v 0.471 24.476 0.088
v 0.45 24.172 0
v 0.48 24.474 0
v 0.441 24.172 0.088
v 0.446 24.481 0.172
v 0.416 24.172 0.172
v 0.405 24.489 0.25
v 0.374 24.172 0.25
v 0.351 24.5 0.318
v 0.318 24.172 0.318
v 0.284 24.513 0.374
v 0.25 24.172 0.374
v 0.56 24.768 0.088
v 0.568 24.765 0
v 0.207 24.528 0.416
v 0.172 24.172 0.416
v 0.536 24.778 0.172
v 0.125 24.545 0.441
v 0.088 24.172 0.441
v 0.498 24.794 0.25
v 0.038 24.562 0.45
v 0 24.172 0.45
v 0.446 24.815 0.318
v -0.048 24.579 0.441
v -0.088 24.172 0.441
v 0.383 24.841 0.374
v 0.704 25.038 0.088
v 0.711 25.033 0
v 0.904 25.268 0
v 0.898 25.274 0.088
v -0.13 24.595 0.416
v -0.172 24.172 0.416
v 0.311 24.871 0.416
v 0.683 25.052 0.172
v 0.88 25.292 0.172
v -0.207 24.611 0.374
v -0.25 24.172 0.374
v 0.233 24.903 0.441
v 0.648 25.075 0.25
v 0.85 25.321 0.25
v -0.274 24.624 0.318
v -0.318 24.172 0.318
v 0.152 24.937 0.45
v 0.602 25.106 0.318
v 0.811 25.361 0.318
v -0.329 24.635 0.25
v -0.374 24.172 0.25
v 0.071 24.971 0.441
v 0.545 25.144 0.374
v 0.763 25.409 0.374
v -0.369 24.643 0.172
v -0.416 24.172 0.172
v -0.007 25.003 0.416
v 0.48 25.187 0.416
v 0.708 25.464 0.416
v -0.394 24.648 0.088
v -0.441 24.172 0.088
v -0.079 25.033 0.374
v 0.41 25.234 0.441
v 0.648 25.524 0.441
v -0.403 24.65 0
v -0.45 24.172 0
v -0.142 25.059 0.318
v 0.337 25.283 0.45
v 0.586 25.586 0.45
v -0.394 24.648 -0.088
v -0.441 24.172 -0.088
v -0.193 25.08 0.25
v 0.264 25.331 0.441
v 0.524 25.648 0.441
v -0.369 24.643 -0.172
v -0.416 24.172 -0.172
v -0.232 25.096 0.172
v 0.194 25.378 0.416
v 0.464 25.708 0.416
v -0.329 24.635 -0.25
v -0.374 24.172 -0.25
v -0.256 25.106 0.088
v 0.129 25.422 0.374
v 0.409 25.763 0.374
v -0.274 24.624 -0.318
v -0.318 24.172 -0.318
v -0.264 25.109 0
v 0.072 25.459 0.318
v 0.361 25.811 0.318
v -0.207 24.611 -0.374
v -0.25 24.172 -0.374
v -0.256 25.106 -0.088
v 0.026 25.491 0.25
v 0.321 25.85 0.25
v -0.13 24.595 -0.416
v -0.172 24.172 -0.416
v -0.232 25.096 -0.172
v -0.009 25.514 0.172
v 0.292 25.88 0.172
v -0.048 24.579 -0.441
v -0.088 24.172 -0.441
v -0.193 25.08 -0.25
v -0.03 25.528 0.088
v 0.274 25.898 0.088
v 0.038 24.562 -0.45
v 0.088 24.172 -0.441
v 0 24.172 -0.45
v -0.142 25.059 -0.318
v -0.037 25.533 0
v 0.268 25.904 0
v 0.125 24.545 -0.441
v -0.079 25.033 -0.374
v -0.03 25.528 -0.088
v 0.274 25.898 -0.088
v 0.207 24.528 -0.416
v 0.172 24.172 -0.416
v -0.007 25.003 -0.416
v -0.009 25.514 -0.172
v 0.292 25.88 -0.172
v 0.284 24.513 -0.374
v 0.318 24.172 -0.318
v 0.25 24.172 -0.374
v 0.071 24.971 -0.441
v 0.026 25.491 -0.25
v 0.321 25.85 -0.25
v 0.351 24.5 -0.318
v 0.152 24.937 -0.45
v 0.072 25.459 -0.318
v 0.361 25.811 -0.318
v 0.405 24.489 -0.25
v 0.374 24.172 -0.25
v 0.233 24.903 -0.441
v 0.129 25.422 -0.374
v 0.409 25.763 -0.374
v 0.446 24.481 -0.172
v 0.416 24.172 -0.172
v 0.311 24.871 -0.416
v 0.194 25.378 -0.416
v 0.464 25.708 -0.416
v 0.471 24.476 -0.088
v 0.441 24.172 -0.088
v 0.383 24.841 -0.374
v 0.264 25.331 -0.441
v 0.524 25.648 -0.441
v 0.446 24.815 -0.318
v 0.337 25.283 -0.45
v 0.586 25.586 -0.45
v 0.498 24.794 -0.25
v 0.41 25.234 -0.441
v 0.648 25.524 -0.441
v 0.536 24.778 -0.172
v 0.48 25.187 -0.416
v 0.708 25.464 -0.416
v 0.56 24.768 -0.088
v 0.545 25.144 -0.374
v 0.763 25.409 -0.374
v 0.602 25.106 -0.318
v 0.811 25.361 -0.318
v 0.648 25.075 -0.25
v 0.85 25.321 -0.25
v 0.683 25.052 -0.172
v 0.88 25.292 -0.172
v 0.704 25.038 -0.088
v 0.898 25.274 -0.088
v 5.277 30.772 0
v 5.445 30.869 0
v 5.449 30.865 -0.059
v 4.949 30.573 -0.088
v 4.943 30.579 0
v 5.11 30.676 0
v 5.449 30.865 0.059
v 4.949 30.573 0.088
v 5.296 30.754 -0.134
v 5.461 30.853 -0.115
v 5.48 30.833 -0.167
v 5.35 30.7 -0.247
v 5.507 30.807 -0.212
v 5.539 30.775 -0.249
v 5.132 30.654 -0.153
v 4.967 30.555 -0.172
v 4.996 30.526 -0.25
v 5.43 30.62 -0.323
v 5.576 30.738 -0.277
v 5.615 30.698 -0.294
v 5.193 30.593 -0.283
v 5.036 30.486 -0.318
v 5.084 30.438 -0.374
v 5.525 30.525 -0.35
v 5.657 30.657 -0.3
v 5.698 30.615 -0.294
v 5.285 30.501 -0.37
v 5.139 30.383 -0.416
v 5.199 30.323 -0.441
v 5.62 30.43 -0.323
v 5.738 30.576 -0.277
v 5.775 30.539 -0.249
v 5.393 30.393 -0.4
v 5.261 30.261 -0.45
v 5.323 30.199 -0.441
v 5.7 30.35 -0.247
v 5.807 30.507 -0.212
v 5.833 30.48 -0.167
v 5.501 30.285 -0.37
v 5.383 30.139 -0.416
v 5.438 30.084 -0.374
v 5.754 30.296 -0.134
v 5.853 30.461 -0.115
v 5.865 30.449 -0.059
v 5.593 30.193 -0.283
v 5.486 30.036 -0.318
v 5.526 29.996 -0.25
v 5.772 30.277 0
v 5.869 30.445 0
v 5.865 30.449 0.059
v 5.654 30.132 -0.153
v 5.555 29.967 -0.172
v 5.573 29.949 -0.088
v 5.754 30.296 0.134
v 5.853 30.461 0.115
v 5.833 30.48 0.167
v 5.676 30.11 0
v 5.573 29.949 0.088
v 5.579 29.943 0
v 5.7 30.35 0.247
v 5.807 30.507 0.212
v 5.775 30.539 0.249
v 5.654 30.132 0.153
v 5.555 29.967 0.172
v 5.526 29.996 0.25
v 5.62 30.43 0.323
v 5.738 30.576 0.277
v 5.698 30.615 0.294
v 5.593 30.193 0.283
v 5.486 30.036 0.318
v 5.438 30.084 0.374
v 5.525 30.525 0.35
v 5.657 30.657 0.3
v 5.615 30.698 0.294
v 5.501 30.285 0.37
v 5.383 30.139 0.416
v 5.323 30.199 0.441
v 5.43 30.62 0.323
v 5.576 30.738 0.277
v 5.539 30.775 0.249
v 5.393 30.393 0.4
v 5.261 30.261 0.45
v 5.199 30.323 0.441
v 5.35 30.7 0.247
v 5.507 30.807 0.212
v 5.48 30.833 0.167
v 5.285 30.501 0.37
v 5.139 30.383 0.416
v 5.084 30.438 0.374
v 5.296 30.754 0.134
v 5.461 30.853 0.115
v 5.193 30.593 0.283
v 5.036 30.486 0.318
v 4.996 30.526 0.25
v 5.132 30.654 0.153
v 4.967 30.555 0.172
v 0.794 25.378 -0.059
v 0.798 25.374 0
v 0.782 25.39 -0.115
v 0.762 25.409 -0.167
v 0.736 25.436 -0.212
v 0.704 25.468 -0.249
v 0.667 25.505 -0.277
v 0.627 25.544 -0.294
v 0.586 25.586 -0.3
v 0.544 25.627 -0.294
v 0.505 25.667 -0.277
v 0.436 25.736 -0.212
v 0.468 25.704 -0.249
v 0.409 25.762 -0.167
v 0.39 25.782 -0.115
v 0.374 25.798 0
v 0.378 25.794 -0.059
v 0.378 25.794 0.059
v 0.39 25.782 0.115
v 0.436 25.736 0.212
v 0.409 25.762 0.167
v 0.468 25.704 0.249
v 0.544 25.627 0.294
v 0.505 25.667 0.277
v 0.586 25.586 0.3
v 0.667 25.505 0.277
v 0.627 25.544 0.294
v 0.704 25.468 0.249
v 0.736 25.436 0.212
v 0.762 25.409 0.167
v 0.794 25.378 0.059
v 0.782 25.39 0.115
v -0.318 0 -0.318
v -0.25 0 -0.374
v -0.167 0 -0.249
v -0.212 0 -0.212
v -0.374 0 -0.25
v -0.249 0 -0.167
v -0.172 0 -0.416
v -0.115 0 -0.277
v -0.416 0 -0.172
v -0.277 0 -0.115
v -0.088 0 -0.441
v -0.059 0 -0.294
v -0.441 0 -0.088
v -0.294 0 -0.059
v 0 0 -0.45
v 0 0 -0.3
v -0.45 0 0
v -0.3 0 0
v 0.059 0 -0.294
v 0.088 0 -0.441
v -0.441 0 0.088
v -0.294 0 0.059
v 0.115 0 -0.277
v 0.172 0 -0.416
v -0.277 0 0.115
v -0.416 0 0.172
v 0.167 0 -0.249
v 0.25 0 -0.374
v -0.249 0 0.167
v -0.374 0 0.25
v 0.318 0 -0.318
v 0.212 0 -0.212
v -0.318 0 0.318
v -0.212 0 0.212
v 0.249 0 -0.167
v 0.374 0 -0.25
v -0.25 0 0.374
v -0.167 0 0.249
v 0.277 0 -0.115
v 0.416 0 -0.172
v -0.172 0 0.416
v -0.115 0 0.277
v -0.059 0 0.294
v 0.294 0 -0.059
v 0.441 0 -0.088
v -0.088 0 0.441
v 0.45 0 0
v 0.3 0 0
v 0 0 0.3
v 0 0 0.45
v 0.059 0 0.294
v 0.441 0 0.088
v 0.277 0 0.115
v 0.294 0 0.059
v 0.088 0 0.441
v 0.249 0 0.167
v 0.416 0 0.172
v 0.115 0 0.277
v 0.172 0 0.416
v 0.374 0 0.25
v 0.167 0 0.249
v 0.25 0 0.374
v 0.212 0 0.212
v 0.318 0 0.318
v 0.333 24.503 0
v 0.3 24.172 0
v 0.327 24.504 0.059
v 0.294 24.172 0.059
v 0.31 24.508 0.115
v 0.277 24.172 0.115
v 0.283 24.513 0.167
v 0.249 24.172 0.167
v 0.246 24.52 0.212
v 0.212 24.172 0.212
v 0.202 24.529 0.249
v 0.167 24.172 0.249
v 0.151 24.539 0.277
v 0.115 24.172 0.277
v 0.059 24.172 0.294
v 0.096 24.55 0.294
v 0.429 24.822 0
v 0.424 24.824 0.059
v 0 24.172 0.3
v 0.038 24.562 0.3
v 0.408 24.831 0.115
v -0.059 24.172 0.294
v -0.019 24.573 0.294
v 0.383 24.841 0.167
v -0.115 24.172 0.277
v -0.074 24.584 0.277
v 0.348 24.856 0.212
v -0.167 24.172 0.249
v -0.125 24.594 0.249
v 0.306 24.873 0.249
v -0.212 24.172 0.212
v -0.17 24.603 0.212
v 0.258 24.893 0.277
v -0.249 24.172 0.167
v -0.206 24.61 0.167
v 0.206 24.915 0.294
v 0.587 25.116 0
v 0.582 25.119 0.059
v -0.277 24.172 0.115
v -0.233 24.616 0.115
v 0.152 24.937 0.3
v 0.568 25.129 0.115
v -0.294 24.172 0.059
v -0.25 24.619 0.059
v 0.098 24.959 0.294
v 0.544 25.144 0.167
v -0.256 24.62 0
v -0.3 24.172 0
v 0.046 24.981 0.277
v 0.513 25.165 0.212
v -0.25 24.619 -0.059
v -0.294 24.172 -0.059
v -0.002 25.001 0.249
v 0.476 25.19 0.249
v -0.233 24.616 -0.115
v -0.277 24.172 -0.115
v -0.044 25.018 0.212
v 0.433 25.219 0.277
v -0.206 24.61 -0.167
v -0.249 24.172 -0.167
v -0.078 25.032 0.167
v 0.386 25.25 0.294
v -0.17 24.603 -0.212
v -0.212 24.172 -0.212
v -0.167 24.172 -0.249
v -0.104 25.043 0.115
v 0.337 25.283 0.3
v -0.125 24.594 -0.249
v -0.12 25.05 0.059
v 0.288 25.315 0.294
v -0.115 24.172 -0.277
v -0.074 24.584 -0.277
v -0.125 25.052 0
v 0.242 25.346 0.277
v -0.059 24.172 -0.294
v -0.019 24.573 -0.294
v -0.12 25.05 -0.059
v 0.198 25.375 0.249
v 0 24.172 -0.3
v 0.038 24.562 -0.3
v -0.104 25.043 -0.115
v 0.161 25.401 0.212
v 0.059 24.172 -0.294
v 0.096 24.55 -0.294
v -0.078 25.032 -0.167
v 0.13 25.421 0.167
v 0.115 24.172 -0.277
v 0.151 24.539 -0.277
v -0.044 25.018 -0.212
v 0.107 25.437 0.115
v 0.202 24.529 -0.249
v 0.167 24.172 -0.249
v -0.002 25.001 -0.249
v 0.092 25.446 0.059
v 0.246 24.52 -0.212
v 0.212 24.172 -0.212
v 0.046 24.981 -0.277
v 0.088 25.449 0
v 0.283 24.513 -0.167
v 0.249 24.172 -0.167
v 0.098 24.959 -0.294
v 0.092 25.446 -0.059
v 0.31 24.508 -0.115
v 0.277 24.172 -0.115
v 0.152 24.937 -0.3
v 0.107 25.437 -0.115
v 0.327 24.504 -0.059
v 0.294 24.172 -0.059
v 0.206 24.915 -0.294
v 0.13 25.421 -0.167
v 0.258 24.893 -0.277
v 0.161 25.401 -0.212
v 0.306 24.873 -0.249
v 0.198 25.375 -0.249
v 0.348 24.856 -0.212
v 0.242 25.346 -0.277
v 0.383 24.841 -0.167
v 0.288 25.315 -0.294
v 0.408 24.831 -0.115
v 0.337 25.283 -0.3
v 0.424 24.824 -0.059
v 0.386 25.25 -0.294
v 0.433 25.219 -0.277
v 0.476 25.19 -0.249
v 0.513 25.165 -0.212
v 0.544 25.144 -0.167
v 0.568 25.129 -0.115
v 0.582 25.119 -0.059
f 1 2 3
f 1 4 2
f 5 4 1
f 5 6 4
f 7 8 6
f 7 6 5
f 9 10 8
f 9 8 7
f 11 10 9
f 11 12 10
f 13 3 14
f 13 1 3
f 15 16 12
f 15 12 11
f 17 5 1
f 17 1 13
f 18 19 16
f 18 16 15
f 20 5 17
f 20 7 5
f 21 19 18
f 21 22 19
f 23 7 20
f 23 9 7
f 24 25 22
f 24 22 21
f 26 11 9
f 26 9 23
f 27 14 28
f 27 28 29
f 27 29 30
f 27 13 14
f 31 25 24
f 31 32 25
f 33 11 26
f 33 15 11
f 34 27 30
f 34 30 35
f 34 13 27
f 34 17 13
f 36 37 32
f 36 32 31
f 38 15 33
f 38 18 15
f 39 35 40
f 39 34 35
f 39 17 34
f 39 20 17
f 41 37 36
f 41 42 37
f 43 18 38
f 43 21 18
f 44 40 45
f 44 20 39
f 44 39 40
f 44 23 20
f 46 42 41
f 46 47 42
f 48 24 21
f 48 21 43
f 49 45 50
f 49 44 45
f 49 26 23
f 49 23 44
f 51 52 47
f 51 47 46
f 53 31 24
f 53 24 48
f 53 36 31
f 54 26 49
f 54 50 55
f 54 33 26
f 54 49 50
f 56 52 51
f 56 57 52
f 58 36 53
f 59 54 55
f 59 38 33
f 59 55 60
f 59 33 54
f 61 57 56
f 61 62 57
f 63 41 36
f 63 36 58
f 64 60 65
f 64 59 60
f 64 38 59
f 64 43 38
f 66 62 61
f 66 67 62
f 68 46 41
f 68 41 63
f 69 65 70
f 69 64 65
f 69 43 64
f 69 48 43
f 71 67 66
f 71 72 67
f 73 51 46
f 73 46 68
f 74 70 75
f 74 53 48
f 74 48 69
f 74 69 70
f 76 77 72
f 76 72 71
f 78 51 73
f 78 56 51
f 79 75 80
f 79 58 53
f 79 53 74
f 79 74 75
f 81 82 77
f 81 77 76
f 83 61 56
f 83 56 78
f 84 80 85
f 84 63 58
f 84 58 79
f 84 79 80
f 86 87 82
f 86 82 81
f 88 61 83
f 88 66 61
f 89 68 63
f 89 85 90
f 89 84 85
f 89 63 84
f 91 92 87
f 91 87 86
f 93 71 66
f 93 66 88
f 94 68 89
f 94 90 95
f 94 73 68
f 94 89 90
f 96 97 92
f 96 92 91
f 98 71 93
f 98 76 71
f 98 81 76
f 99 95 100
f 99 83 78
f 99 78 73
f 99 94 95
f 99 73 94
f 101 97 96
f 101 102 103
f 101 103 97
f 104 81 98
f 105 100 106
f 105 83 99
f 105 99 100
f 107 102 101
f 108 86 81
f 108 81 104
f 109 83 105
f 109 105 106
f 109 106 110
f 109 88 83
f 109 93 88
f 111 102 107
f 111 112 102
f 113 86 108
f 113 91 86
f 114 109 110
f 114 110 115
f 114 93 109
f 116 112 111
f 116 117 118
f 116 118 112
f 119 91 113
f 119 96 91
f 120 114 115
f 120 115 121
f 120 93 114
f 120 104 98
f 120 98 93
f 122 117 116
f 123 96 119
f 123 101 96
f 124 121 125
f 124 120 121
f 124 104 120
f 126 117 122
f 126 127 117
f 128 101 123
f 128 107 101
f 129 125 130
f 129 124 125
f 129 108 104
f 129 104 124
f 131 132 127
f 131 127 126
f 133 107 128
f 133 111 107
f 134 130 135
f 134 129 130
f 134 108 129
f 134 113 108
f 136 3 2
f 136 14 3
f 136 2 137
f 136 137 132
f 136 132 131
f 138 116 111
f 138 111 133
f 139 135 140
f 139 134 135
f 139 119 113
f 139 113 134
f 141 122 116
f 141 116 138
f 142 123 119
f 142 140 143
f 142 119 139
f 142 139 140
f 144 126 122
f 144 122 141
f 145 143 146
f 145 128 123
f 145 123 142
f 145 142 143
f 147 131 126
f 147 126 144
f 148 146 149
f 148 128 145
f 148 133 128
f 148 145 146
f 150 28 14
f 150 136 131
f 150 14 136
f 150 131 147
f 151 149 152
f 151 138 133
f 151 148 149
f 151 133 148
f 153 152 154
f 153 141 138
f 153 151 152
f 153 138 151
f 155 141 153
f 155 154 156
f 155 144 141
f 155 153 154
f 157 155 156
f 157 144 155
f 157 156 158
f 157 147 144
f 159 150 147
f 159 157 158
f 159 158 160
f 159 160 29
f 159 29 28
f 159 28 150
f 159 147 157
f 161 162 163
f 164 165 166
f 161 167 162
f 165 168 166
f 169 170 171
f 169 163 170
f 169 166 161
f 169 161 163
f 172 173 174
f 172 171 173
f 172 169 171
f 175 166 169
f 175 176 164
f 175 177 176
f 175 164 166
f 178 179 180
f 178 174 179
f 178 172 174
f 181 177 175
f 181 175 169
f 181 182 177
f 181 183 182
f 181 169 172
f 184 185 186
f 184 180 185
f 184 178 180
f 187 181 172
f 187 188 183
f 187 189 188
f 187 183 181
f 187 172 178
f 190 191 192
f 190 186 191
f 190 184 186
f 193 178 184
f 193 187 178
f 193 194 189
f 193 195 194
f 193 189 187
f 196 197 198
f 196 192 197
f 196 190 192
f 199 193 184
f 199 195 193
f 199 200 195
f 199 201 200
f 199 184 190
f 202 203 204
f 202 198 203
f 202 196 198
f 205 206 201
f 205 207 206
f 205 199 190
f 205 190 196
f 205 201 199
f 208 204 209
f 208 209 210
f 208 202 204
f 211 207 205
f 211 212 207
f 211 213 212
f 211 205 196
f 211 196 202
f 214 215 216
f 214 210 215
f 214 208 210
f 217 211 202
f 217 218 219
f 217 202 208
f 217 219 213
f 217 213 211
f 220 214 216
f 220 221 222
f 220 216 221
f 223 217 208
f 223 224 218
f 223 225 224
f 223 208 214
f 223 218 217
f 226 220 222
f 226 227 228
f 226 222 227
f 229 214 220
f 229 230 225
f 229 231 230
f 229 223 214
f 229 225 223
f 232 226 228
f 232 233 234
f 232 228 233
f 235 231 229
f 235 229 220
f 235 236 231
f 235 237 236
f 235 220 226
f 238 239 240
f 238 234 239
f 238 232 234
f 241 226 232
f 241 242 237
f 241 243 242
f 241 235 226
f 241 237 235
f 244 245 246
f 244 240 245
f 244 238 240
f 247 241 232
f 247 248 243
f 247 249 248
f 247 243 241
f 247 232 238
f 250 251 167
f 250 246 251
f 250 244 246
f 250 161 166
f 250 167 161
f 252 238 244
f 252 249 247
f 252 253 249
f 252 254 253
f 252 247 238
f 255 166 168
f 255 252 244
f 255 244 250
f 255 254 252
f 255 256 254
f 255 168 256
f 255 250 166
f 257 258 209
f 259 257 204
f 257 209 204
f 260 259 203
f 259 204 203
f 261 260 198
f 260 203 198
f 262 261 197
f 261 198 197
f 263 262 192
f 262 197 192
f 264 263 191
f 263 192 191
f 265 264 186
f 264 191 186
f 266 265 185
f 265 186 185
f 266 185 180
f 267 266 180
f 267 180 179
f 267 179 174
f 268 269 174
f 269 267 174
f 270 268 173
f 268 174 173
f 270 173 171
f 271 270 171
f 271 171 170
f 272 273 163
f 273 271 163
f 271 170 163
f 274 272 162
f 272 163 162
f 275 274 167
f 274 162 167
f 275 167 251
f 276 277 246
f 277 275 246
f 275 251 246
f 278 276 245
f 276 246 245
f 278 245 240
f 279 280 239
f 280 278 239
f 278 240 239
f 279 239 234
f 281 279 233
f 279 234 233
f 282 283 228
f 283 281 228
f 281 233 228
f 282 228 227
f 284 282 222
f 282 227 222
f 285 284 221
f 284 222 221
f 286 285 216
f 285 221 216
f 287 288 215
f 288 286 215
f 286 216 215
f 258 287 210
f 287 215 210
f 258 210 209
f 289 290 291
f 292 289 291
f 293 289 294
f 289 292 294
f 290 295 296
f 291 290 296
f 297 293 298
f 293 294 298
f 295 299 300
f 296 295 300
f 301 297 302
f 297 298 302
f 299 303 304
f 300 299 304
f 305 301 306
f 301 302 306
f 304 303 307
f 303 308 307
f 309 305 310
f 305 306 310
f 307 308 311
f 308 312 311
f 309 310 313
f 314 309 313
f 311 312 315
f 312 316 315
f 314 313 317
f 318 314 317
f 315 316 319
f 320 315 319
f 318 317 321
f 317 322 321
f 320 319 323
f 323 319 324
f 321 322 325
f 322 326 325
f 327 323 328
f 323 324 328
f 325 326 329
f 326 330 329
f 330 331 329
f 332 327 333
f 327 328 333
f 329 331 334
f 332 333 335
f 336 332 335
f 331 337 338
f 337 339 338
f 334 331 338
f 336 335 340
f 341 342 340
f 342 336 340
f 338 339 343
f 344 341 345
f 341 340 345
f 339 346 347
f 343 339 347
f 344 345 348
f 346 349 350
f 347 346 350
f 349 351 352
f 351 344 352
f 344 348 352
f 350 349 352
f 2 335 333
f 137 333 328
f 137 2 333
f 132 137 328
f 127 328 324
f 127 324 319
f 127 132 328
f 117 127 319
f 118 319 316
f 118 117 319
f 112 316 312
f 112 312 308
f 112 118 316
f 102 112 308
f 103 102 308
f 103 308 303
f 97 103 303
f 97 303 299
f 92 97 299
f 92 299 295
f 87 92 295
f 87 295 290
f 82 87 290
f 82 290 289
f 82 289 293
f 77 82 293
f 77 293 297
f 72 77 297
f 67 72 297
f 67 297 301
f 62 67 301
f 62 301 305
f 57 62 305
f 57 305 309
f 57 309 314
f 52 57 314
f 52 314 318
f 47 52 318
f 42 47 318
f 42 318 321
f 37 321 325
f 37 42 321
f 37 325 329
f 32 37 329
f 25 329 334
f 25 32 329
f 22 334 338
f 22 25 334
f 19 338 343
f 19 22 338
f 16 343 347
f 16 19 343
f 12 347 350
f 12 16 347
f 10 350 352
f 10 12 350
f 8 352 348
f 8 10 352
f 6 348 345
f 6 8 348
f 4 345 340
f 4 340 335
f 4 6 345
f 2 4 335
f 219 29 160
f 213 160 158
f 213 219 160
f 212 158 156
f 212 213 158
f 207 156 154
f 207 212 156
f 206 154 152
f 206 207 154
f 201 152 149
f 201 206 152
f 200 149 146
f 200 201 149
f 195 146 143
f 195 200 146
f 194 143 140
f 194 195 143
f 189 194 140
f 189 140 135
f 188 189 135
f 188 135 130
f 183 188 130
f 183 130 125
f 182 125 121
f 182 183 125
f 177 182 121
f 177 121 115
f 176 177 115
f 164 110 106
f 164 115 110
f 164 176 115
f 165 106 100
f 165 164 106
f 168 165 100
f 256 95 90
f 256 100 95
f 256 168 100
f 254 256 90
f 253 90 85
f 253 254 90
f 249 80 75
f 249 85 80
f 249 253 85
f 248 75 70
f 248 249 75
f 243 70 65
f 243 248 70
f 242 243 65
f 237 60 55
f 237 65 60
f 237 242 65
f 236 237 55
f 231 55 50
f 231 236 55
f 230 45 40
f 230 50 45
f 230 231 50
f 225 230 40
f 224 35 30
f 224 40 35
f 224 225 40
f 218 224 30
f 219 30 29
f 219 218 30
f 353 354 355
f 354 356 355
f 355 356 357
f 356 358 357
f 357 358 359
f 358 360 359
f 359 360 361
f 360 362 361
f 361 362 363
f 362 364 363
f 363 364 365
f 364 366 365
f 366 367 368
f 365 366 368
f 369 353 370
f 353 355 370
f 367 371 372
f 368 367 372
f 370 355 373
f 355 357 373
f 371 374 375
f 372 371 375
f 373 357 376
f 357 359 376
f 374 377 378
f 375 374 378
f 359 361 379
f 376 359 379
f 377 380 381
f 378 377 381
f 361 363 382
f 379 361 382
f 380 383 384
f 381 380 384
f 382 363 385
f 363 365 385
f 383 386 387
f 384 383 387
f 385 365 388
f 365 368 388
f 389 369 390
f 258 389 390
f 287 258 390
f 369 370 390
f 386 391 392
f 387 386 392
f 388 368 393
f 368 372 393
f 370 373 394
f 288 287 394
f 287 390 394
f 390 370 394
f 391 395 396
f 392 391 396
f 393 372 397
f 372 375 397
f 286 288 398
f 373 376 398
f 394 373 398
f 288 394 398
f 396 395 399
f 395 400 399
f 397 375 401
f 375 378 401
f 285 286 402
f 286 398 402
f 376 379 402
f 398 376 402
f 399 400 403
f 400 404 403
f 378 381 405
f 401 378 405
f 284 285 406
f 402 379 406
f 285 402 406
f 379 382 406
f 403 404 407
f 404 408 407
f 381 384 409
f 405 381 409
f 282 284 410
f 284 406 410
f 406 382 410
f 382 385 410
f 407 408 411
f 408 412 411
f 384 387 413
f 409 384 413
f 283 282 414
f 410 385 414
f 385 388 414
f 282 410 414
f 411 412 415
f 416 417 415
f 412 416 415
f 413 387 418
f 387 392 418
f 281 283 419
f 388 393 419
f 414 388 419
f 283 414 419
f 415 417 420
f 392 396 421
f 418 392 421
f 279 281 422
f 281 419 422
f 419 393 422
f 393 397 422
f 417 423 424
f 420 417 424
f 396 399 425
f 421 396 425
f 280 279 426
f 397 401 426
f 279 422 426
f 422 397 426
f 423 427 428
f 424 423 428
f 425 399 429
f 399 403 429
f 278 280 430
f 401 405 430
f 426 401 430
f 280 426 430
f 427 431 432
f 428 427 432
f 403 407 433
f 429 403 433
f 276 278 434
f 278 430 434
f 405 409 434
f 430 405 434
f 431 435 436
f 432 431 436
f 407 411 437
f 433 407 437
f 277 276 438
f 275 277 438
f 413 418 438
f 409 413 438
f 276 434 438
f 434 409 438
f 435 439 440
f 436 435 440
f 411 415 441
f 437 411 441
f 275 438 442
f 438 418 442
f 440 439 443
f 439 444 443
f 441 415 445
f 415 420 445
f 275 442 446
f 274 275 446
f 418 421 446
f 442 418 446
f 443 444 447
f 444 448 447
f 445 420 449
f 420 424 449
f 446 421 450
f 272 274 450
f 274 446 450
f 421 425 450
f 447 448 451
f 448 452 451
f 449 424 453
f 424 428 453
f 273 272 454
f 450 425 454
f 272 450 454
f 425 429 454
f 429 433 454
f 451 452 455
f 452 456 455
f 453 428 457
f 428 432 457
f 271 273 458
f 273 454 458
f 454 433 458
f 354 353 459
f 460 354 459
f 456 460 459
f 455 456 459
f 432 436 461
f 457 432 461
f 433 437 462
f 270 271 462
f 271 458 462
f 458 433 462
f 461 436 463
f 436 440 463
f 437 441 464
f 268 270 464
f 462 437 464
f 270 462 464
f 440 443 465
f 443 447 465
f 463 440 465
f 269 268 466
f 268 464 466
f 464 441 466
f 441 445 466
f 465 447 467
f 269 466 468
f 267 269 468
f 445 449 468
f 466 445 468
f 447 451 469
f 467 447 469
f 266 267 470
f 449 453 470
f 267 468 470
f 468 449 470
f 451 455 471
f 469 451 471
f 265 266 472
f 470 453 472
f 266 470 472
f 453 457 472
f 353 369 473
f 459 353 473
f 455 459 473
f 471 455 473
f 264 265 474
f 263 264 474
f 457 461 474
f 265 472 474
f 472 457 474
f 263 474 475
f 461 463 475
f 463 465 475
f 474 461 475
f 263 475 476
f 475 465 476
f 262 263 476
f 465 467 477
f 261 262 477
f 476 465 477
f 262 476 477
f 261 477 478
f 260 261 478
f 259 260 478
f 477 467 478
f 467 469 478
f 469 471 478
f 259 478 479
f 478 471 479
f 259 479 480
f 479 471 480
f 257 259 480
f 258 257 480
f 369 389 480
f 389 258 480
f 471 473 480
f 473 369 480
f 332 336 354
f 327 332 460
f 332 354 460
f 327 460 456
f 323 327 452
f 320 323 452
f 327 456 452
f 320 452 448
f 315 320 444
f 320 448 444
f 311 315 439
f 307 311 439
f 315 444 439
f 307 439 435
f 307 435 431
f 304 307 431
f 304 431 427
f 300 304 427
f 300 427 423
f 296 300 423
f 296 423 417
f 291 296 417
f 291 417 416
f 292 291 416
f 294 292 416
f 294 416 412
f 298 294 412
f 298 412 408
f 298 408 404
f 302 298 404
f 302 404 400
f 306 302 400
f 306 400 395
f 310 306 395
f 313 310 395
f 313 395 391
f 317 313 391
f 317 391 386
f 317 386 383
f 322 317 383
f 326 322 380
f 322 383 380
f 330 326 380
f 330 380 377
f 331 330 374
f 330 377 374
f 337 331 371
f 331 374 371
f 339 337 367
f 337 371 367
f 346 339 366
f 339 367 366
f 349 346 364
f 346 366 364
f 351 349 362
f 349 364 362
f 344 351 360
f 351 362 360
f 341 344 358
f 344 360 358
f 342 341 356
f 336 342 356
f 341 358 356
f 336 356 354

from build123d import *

# Parameters (mm, degrees)
SKETCH8_R   = 0.45
SKETCH8_R_2 = 0.3


with BuildPart() as part:
    # Sweep1: sweep along a path in Sketch7
    with BuildLine(Plane.XY) as sweep1_path:
        Line((0, 0), (0, 24.171572875))
        ThreePointArc((0, 24.171572875), (0.152240935, 24.93693974), (0.585786438, 25.585786438))
        Line((0.585786438, 25.585786438), (5.656854249, 30.656854249))
    # Sketch8 → Sweep1 (sweep)
    with BuildSketch(Plane(origin=(0, 0, 0), x_dir=(1, 0, 0), z_dir=(0, 1, 0))):
        Circle(SKETCH8_R)
        Circle(SKETCH8_R_2, mode=Mode.SUBTRACT)
    sweep(path=sweep1_path.line)

    # Sketch9 → Cut-Revolve3 (revolve, cut)
    with BuildSketch(Plane.XY):
        Polygon((5.975052301, 30.338656198), (5.868986284, 30.444722215), (5.579208536, 29.942812433), align=None)
    revolve(axis=Axis((6.207317526, 31.207317526, 0), (-0.7071067811865472, -0.7071067811865479, 0)), mode=Mode.SUBTRACT)


solid = part.part
